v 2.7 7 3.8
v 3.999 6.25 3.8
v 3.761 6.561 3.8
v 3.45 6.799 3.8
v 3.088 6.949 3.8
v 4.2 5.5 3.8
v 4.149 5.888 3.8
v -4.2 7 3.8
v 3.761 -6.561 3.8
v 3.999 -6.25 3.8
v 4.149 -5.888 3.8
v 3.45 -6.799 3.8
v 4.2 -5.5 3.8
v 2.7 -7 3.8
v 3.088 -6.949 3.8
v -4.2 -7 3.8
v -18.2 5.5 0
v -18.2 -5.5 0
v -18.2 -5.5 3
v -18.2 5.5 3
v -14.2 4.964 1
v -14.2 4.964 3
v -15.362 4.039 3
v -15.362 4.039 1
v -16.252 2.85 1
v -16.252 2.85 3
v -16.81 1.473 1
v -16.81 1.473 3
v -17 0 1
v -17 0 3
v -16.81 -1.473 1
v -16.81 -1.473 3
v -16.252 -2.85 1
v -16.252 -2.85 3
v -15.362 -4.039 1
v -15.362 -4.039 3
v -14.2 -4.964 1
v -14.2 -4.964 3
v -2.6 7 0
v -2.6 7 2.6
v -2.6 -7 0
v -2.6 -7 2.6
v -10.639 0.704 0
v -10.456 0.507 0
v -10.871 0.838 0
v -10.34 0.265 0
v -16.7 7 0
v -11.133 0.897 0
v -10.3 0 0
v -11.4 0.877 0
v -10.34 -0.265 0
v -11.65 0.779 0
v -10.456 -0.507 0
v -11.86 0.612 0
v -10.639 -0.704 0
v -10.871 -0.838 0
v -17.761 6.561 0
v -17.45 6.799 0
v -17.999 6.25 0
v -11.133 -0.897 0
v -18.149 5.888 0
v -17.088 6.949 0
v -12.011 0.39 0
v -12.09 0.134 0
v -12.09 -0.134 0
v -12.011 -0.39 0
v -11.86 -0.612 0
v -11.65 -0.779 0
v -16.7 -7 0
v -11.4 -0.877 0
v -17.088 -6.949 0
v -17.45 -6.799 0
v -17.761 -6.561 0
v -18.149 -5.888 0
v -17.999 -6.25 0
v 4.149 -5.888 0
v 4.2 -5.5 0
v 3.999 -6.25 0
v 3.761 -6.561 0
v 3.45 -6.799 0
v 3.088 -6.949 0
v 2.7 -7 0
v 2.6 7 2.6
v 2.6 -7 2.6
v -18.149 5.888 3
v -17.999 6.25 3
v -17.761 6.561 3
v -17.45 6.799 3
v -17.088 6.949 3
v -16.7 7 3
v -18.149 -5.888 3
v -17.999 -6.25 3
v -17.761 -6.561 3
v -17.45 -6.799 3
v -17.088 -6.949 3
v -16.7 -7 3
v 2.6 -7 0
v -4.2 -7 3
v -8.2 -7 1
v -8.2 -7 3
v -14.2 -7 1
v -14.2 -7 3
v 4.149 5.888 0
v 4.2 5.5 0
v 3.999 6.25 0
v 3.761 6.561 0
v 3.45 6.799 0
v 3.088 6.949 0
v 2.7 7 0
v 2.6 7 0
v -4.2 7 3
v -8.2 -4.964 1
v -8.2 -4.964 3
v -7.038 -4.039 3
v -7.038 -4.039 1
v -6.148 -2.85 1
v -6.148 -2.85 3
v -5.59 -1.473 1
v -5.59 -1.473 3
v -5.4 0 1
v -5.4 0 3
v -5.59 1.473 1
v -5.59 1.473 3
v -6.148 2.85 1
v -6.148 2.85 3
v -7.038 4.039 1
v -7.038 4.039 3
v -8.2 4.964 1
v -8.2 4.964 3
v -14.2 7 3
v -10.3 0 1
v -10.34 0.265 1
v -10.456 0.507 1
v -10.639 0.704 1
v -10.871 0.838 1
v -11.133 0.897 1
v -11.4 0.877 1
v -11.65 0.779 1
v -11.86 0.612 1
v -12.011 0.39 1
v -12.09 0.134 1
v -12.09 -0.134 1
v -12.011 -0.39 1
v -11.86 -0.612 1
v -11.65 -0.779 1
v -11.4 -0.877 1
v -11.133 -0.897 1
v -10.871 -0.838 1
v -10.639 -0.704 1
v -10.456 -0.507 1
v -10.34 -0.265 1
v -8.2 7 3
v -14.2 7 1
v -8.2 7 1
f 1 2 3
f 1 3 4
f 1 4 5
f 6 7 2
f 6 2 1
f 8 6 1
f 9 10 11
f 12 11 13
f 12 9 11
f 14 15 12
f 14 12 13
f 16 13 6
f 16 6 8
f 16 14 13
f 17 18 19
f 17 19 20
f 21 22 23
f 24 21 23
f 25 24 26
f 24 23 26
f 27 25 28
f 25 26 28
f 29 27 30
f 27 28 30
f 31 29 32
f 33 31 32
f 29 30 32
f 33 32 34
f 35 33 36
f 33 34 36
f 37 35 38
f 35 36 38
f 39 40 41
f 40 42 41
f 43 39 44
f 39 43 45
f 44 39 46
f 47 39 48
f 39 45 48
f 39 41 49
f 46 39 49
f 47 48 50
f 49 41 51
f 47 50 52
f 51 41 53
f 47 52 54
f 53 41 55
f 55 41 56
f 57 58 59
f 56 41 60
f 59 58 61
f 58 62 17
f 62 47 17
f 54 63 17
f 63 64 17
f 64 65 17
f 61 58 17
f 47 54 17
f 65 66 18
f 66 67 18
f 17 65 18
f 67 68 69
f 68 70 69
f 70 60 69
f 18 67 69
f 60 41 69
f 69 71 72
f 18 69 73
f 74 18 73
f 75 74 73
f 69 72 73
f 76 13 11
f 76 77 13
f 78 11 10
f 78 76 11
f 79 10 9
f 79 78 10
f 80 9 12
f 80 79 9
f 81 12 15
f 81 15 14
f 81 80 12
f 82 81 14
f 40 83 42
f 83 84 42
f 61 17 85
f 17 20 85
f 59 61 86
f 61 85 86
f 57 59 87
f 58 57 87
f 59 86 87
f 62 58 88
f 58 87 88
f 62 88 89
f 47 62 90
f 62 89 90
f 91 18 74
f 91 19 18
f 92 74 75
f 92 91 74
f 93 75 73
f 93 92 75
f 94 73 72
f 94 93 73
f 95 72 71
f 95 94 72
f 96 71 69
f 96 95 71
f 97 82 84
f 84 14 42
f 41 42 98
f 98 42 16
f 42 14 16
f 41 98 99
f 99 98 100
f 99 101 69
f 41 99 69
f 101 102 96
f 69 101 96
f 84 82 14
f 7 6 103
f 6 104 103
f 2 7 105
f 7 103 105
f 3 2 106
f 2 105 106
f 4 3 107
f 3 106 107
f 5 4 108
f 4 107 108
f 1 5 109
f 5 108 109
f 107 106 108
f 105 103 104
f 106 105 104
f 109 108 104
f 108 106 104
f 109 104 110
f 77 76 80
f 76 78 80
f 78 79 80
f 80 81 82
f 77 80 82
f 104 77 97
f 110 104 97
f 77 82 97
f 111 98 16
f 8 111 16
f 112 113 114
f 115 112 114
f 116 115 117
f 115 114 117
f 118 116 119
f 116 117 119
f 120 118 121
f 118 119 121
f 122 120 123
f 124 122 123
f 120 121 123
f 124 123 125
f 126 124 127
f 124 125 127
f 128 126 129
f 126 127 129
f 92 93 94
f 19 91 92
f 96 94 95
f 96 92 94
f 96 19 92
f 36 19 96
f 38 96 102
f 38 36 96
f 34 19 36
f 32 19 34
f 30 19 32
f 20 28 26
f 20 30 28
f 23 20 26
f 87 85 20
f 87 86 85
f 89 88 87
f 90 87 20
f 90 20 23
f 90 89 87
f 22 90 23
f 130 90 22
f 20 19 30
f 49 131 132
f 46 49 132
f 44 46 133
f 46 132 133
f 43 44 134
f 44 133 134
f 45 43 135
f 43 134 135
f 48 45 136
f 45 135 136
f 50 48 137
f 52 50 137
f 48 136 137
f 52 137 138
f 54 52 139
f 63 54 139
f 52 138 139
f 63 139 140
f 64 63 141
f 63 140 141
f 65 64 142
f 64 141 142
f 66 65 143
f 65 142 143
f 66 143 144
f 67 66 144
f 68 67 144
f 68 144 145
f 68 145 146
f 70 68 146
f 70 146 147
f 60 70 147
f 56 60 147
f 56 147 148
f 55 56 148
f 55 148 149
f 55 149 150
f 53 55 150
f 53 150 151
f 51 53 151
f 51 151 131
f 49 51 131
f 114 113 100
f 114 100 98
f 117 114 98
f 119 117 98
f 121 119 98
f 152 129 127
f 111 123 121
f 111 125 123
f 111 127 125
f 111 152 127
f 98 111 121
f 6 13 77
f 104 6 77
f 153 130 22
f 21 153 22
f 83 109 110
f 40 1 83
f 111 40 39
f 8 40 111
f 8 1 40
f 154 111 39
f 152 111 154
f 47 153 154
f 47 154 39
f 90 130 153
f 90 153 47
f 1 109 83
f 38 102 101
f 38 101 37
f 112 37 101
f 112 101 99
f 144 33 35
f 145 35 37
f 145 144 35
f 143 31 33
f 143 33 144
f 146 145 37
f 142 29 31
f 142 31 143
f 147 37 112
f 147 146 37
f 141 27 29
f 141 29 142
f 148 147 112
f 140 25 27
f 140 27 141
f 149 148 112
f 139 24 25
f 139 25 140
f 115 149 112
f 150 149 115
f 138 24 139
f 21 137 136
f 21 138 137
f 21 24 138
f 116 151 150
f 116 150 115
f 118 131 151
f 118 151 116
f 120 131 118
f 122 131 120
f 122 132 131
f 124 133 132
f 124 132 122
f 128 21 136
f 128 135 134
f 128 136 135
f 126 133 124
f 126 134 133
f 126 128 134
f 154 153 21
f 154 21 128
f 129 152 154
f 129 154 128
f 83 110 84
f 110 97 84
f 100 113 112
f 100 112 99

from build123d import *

# Parameters (mm, degrees)
PAD_DEPTH       = 7
SKETCH006_W     = 14
SKETCH006_H     = 14
PAD002_DEPTH    = 3
POCKET004_DEPTH = 2
SKETCH008_R     = 0.9
POCKET005_DEPTH = 1.001
FILLET_R        = 1.5


with BuildPart() as clamp_unit:
    # Sketch → Pad (new body, symmetric)
    with BuildSketch(Plane.XZ):
        Polygon((-2.6, 3.8), (4.2, 3.8), (4.2, 0), (2.6, 0), (2.6, 2.6), (-2.6, 2.6), (-2.6, 0), (-4.2, 0), (-4.2, 3.8), align=None)
    extrude(amount=PAD_DEPTH, both=True)


with BuildPart() as wire_holder_single_rounded:
    # Sketch006 → Pad002 (new body)
    with BuildSketch(Plane.XY):
        Rectangle(SKETCH006_W, SKETCH006_H)
    extrude(amount=PAD002_DEPTH)

    # Sketch007 → Pocket004 (cut)
    with BuildSketch(Plane.XY.offset(3)):
        with BuildLine():
            Line((-3, 7), (-3, 4.963869))
            ThreePointArc((-3, 4.963869), (-5.8, 0), (-3, -4.963869))
            Line((-3, -7), (-3, -4.963869))
            Line((3, -7), (-3, -7))
            Line((3, -4.963869), (3, -7))
            ThreePointArc((3, -4.963869), (5.8, 0), (3, 4.963869))
            Line((3, 7), (3, 4.963869))
            Line((-3, 7), (3, 7))
        make_face()
    extrude(amount=-POCKET004_DEPTH, mode=Mode.SUBTRACT)

    # Sketch008 → Pocket005 (cut, through all)
    with BuildSketch(Plane.XY.offset(1)):
        Circle(SKETCH008_R)
    extrude(amount=-POCKET005_DEPTH, mode=Mode.SUBTRACT)


with BuildPart() as wire_holder_single_rounded_1:
    # Clone placement: moved
    add(wire_holder_single_rounded.part.moved(Location((-11.2, 0, 0))))

    # Fusion: union clamp-unit
    add(clamp_unit.part)

    # Fillet
    fillet_edges = [wire_holder_single_rounded_1.edges().sort_by_distance(p)[0] for p in [
        (-18.2, -7, 1.5),
        (-18.2, 7, 1.5),
        (4.2, 7, 1.9),
        (4.2, -7, 1.9),
    ]]
    fillet(fillet_edges, radius=FILLET_R)


solid = wire_holder_single_rounded_1.part
